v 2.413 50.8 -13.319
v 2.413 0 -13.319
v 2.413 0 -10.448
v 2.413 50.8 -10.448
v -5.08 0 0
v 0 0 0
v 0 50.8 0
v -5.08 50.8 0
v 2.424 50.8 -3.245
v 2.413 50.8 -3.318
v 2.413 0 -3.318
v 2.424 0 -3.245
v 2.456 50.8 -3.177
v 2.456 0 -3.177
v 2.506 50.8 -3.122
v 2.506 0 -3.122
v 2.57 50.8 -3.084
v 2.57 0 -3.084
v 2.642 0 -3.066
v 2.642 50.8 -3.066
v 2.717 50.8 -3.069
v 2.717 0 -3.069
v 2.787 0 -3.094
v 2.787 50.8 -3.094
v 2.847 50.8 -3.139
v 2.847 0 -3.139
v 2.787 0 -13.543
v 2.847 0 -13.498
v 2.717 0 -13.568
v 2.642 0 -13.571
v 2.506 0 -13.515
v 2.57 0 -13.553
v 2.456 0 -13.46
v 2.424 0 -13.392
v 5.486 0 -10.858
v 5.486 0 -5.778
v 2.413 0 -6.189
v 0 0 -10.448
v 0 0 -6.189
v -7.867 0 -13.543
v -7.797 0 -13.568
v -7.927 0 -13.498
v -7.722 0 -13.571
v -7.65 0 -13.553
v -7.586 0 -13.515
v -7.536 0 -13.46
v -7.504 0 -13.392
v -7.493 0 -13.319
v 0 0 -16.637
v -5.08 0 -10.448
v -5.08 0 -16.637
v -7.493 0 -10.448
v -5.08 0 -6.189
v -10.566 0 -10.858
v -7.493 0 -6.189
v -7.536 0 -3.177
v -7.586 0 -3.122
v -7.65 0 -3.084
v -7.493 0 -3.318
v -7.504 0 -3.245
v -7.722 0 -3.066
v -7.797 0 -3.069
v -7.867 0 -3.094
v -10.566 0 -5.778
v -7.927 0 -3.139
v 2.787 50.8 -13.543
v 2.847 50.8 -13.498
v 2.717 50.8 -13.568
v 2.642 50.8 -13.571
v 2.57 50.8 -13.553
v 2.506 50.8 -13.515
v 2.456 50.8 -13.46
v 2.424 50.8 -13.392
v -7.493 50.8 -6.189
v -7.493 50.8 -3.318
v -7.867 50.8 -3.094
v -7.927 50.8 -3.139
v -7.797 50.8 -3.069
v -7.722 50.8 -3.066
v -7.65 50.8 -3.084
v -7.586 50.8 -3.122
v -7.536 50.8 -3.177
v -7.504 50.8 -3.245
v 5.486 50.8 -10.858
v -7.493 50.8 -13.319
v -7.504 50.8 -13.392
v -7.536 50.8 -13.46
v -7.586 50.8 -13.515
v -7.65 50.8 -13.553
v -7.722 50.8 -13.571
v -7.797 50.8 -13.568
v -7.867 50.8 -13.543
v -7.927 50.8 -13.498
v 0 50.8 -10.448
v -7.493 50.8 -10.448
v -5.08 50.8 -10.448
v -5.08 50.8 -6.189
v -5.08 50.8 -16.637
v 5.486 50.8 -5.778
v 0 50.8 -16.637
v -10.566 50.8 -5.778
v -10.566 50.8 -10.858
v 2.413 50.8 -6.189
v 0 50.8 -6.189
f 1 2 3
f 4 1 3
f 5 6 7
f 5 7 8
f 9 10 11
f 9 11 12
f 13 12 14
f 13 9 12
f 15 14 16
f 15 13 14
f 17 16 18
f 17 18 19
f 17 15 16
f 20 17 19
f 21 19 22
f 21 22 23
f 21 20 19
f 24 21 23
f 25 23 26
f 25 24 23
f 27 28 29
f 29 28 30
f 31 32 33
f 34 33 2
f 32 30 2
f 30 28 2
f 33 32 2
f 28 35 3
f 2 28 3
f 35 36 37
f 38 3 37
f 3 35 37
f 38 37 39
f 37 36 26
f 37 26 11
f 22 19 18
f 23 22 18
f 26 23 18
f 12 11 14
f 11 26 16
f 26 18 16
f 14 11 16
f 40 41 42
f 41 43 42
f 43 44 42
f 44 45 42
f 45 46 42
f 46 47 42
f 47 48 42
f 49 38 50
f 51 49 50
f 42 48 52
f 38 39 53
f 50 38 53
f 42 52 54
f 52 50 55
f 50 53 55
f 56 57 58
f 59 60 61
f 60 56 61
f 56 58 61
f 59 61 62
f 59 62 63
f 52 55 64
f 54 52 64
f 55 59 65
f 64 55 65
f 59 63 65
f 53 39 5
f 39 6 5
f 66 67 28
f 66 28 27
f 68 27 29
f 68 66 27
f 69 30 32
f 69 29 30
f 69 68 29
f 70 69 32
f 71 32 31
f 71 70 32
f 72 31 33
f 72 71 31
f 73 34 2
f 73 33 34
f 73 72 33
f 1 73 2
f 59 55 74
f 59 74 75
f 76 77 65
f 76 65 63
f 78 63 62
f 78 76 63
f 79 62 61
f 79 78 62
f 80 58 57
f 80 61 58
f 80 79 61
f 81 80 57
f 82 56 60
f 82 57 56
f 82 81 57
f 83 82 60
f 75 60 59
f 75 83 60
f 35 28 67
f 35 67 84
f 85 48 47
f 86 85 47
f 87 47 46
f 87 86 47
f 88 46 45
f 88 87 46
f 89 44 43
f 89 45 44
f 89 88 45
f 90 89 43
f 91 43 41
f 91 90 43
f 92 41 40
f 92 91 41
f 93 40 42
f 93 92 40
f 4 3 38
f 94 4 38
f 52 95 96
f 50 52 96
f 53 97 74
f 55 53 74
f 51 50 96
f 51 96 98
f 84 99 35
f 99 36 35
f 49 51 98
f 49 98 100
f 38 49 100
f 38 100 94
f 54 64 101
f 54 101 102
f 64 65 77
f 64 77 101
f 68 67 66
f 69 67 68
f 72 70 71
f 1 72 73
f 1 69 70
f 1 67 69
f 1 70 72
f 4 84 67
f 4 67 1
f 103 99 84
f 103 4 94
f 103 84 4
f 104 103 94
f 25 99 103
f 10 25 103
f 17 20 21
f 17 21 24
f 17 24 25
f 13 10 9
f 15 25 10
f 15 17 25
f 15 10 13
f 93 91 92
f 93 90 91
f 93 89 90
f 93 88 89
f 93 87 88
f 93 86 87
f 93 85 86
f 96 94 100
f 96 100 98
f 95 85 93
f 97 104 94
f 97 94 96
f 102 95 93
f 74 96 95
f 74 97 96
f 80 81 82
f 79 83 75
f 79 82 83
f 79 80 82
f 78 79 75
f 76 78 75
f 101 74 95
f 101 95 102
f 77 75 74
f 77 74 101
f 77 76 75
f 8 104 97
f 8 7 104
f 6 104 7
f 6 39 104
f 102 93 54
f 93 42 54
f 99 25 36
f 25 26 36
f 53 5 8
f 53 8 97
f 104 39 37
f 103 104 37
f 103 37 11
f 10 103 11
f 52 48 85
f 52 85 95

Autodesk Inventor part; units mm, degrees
ref_plane "YZ Plane" through (0, 0, 0) normal (1, 0, 0) x (0, 1, 0)
ref_plane "XZ Plane" through (0, 0, 0) normal (0, 1, 0) x (-1, 0, 0)
ref_plane "XY Plane" through (0, 0, 0) normal (0, 0, 1) x (1, 0, 0)
sketch "Sketch1" plane through (0, 0, 0) normal (0, 1, 0) x (-1, 0, 0)
  line L0 (0, 0) -> (5.08, 0)
  line L1 (5.08, 0) -> (5.08, -16.637)
  line L2 (5.08, -16.637) -> (0, -16.637)
  line L3 (0, -16.637) -> (0, 0)
  line L4 (0, -6.1892) -> (7.493, -6.1892)
  line L5 (7.493, -6.1892) -> (7.493, -10.4478)
  line L6 (7.493, -10.4478) -> (0, -10.4478)
  line L7 (10.5664, -5.7785) -> (10.5664, -10.8585)
  line L8 (7.493, -13.9319) -> (7.493, -2.7051)
  line L9 (7.493, -13.9319) -> (10.5664, -10.8585)
  line L10 (7.493, -2.7051) -> (10.5664, -5.7785)
  line L11 (0, -6.1892) -> (-2.413, -6.1892)
  line L12 (-2.413, -10.4478) -> (0, -10.4478)
  line L13 (-5.4864, -5.7785) -> (-5.4864, -10.8585)
  line L14 (-2.413, -13.9319) -> (-2.413, -2.7051)
  line L15 (-2.413, -13.9319) -> (-5.4864, -10.8585)
  line L16 (-2.413, -2.7051) -> (-5.4864, -5.7785)
  point P0 (-4.9276, -6.1892)
  dimension "d0" = 5.08
  dimension "d1" = 16.637
  dimension "d2" = 2.413
  dimension "d9" = 3.0734
  dimension "d12" = 0
  dimension "d16" = 11.2268
  dimension "d20" = 135
  dimension "d21" = 135
  dimension "d24" = 6.1893
  dimension "d25" = 16.637
  dimension "d26" = 3.4842
  dimension "d33" = 3.4842
  dimension "d34" = 3.0734
  dimension "d35" = 2.413
  dimension "d36" = 6.1893
  dimension "d37" = 5.08
  dimension "d38" = 5.08
  dimension "d39" = 135
  dimension "d40" = 135
extrude "Extrusion2" add sketch "Sketch1" along normal blind 50.8
fillet "Fillet1" radius 0.254 4 edges at (2.413, 25.4, -13.9319) (-7.493, 25.4, -13.9319) (2.413, 25.4, -2.7051) (-7.493, 25.4, -2.7051)
equation "\"d16\" = d15"
equation "\"d21\" = d20"
equation "\"d24\" = -0.5 * d4 + 0.5 * d25"
equation "\"d15\" = 11.2268"
equation "\"d4\" = 4.2585"
properties part number "20X20 lift conecter" material "PC/ABS Plastic"
